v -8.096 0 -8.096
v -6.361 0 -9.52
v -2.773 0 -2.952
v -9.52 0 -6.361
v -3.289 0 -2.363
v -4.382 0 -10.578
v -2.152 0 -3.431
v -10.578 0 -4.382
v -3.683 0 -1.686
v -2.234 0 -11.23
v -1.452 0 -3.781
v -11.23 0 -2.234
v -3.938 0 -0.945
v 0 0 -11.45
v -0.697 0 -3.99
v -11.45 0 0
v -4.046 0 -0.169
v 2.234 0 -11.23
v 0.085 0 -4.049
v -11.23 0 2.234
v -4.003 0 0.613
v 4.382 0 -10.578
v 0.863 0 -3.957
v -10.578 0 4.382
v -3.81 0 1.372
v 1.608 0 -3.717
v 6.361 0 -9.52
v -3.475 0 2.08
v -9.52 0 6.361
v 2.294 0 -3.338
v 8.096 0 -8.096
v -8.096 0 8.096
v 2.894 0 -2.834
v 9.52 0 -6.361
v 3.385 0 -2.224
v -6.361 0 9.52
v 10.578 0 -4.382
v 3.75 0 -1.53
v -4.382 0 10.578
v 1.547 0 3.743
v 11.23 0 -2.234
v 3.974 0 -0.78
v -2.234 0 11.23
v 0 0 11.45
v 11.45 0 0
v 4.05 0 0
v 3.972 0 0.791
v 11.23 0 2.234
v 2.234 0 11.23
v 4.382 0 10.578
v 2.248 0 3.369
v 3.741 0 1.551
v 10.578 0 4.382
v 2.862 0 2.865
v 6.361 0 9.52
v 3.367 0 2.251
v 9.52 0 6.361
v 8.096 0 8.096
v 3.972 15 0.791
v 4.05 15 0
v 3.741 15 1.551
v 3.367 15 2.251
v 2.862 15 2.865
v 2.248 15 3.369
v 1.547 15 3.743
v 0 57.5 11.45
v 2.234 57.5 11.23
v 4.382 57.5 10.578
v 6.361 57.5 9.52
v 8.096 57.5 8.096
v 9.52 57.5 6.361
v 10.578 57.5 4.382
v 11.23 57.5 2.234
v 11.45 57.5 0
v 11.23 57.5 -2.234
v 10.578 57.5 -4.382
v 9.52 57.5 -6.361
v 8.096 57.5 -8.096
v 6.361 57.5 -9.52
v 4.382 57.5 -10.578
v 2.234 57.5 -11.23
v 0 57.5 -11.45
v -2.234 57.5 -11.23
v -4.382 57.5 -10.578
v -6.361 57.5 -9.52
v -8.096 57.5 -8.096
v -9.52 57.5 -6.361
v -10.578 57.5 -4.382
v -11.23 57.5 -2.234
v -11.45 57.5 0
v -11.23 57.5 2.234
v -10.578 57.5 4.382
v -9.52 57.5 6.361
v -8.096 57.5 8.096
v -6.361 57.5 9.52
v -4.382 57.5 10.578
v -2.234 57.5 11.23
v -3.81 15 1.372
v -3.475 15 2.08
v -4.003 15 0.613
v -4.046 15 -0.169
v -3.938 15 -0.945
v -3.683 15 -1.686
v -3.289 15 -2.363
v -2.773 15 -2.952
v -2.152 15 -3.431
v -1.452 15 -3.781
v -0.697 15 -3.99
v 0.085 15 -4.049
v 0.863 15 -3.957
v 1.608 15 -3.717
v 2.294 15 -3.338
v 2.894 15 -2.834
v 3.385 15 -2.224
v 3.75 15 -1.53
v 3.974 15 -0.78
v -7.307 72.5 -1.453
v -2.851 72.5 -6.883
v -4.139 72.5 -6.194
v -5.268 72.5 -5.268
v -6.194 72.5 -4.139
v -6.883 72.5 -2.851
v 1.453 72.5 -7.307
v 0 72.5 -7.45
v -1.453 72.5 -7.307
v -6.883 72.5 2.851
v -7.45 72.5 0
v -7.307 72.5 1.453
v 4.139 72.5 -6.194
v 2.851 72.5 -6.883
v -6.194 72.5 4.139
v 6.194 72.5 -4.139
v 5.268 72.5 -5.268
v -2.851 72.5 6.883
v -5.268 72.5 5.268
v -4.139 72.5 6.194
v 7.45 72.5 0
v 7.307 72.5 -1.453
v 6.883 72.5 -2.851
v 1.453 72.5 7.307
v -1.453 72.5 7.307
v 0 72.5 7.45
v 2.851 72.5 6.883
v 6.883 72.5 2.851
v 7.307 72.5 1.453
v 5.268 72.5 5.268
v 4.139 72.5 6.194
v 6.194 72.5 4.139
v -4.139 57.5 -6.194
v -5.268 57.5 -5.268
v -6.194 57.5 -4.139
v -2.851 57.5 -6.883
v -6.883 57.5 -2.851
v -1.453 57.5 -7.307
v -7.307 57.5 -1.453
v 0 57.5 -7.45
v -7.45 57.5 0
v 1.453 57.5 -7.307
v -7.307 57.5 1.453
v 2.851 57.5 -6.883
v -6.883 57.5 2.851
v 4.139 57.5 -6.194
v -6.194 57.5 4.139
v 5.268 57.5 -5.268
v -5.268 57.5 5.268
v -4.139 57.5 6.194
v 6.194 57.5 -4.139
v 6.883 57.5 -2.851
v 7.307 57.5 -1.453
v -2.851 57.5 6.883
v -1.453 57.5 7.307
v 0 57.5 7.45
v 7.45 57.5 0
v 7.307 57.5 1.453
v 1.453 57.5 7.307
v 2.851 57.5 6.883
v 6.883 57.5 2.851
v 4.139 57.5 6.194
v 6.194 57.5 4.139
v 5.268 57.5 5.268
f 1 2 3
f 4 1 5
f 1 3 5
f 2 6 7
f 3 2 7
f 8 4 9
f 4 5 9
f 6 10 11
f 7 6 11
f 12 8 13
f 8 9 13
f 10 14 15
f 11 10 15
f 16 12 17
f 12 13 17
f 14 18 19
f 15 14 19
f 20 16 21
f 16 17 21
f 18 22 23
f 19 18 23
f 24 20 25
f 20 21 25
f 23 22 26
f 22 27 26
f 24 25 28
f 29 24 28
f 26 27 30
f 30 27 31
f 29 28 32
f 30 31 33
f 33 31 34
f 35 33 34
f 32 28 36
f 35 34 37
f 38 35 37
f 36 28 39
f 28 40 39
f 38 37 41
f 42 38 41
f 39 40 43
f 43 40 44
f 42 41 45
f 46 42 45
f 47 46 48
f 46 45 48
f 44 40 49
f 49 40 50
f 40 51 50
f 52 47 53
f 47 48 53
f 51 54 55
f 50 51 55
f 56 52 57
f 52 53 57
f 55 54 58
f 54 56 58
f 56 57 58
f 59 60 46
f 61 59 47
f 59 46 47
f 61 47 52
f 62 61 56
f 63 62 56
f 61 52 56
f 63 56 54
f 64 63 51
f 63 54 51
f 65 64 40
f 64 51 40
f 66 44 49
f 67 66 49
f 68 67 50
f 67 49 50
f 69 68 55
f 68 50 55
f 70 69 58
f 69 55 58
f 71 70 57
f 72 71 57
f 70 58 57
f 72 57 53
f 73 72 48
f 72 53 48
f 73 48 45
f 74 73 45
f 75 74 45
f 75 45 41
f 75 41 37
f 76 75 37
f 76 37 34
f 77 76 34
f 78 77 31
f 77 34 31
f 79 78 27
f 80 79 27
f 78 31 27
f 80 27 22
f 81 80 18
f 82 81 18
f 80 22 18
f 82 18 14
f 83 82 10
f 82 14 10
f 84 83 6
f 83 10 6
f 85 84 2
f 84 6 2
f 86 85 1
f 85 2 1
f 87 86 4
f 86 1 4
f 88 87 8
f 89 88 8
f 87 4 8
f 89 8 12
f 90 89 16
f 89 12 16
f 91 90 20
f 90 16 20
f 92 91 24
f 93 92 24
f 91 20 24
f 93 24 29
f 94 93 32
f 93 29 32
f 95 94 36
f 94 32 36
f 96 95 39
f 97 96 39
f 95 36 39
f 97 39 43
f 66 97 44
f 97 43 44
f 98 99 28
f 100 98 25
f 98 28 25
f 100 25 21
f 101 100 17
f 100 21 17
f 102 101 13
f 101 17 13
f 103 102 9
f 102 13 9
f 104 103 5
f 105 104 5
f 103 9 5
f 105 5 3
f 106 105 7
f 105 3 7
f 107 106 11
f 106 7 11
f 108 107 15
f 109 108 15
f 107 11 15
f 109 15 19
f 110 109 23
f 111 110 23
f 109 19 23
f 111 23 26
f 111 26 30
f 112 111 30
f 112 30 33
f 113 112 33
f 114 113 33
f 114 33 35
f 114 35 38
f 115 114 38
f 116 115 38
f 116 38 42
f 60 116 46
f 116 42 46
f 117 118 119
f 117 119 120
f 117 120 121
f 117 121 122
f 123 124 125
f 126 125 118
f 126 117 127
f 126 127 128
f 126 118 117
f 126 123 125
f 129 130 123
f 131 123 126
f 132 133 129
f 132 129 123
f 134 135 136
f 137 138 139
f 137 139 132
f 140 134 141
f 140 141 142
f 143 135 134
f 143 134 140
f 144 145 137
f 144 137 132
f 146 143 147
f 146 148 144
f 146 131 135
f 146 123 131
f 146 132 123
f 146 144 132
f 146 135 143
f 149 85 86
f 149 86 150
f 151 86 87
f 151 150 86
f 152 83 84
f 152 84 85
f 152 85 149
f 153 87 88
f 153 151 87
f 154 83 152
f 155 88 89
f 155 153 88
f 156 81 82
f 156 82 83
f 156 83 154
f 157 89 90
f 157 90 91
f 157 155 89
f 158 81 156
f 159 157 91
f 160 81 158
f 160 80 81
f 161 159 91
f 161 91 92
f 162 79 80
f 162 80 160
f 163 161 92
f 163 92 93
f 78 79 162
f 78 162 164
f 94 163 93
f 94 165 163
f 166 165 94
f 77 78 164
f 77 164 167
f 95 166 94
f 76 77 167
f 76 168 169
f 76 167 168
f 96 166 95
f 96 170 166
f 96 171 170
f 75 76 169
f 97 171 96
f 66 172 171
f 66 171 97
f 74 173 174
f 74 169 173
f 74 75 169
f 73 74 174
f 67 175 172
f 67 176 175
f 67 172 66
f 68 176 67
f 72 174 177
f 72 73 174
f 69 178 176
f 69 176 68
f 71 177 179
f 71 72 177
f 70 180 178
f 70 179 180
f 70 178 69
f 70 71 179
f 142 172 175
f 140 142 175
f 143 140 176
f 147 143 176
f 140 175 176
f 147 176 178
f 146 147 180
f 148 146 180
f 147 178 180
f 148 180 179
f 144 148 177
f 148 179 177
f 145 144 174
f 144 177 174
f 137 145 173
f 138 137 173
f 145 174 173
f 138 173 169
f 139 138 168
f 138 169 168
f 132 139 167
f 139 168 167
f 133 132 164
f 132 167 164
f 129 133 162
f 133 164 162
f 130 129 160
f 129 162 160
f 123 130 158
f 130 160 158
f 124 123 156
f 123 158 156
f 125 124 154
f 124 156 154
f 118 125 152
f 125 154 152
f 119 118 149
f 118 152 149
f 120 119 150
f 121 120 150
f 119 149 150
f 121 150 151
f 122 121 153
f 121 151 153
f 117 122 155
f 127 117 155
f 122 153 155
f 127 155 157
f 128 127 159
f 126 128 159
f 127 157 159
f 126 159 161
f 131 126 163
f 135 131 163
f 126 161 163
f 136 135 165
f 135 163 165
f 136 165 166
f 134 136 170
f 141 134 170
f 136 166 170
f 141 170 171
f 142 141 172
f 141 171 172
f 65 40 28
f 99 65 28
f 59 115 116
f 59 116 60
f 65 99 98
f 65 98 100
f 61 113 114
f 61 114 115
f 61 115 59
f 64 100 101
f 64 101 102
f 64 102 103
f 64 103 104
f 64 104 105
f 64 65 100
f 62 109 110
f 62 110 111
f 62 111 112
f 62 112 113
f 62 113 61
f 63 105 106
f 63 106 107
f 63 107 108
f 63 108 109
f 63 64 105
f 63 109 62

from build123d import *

# Parameters (mm, degrees)
SKETCH1_R           = 11.45
BOSS_EXTRUDE1_DEPTH = 57.5
SKETCH2_R           = 7.45
BOSS_EXTRUDE2_DEPTH = 15
CUT_EXTRUDE1_DEPTH  = 15


with BuildPart() as part:
    # Sketch1 → Boss-Extrude1 (new body)
    with BuildSketch(Plane(origin=(0, 0, 0), x_dir=(1, 0, 0), z_dir=(0, 1, 0))):
        with Locations(Location((0, 0, 0), (0, 0, 270))):
            Circle(SKETCH1_R)
    extrude(amount=BOSS_EXTRUDE1_DEPTH)

    # Sketch2 → Boss-Extrude2 (add)
    with BuildSketch(Plane(origin=(0, 57.5, 0), x_dir=(1, 0, 0), z_dir=(0, 1, 0))):
        with Locations(Location((0, 0, 0), (0, 0, 270))):
            Circle(SKETCH2_R)
    extrude(amount=BOSS_EXTRUDE2_DEPTH)

    # Sketch3 → Cut-Extrude1 (cut)
    with BuildSketch(Plane.XZ):
        with BuildLine():
            Line((1.547024754, 3.742888511), (-3.474906974, 2.080269579))
            ThreePointArc((-3.474906974, 2.080269579), (-1.079149377, -3.903579975), (4.05, 0))
            ThreePointArc((4.05, 0), (3.366596965, 2.251338462), (1.547024754, 3.742888511))
        make_face()
    extrude(amount=-CUT_EXTRUDE1_DEPTH, mode=Mode.SUBTRACT)


solid = part.part
